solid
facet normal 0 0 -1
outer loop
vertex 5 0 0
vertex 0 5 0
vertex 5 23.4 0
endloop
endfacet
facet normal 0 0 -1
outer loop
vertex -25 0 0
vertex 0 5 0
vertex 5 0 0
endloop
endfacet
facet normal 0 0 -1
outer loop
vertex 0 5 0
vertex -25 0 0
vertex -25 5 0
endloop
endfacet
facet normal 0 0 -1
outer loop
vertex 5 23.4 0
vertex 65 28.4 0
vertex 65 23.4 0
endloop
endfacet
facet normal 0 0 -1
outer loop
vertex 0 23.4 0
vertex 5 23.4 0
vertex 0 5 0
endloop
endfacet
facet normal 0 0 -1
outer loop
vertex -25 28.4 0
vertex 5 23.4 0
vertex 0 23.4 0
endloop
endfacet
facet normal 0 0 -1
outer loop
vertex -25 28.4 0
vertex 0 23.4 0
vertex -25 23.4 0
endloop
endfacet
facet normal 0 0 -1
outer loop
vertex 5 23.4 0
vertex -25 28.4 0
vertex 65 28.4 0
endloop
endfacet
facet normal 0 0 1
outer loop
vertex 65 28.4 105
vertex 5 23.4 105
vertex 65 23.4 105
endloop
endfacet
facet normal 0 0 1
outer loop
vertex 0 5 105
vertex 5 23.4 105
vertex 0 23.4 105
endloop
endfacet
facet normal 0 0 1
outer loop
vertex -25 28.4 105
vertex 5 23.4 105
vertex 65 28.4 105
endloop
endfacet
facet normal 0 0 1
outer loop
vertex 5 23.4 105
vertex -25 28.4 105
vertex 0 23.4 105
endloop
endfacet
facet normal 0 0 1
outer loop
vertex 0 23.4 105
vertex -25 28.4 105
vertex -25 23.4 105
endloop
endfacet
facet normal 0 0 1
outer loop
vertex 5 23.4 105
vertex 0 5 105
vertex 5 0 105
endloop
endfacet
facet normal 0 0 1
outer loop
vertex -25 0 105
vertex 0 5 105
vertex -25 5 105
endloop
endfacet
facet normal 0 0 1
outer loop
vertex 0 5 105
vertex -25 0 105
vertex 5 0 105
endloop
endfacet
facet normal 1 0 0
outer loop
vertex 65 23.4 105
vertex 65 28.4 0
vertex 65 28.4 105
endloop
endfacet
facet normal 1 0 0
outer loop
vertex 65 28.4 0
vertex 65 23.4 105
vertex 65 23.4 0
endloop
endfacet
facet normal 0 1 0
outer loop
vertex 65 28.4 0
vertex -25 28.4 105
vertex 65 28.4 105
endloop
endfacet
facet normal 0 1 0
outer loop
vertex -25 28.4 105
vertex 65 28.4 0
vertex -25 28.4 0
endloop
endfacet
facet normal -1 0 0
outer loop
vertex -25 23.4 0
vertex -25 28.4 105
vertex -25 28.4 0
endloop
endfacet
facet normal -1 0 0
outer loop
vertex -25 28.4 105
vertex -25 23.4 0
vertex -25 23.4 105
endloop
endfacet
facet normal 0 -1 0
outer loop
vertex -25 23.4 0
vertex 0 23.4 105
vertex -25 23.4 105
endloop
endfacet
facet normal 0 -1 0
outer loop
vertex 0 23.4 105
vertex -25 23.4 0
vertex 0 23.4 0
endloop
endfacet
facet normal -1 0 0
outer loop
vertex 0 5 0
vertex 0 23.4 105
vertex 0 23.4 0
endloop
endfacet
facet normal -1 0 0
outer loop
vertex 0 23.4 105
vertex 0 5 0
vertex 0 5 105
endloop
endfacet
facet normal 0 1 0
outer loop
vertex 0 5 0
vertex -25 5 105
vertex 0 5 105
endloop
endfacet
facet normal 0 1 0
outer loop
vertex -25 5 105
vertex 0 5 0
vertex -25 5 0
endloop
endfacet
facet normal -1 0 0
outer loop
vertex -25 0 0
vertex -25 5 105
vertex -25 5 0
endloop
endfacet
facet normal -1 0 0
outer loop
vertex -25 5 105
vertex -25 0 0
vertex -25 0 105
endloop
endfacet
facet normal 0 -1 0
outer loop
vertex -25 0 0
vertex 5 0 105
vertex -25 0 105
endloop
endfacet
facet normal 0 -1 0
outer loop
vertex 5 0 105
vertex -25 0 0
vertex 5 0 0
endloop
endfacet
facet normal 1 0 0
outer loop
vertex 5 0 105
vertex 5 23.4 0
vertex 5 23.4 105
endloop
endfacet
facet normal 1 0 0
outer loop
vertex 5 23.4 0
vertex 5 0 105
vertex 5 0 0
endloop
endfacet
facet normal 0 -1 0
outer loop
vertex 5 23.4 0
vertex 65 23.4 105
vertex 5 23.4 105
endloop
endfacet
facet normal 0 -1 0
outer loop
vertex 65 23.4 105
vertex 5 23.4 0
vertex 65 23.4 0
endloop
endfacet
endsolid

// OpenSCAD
// --- Dimensions ---
shelf_thickness = 18.0;      // Thickness of the shelf (mm)
clamp_gap = 18.4;            // Gap for the shelf (mm)
spine_width = 5.0;           // Width of the vertical spine (mm)
spine_depth = 28.4;          // Depth of the spine (mm)
bottom_jaw_width = 25.0;     // Width of the bottom jaw (mm)
bottom_jaw_depth = 5.0;       // Depth of the bottom jaw (mm)
top_jaw_width = 90.0;        // Total width of top jaw + arm (mm)
top_jaw_depth = 5.0;         // Thickness of the top jaw/arm (mm)
arm_length = 65.0;           // Length of the arm extending forward (mm)
total_height = 105.0;        // Extrusion length along Z (mm)
hole_diameter = 20.0;        // Diameter of pipette holes (mm)
hole_spacing = 35.0;         // Spacing between hole centers (52.5 - 17.5)
hole_x_offset = 42.0;        // X position of hole centers (mm)

// --- Constants ---
$fn = 64;

// --- Modeling ---

// The part is printed lying on its side in the XY plane.
// The profile is defined in the XY plane and extruded along Z.
// Based on user description: 
// +Y is "up" (vertical in use), +X is "away from shelf" (horizontal in use).
// The extrusion is 105mm along Z.

module profile() {
    difference() {
        // Main Body Profile
        union() {
            // Spine: x=[0, 5], y=[0, 28.4]
            translate([0, 0])
                cube([spine_width, spine_depth]);
            
            // Bottom Jaw: x=[-25, 5], y=[0, 5]
            translate([-bottom_jaw_width, 0])
                cube([bottom_jaw_width + spine_width, bottom_jaw_depth]);
            
            // Top Jaw and Arm: x=[-25, 65], y=[23.4, 28.4]
            // Note: x goes from -25 to 65. Total width = 90.
            translate([-bottom_jaw_width, 23.4])
                cube([bottom_jaw_width + arm_length, top_jaw_depth]);
        }

        // Holes: 20mm diameter, through the arm along Y.
        // Centered at x=42, z=17.5, 52.5, 87.5.
        // Since the part is extruded along Z, the "holes" are cylinders 
        // oriented along the Y axis.
        // To make them "through the arm", they must cut through the Y dimension.
        // However, the user says "through the arm along Y (vertically in use)".
        // In the print orientation (XY plane), Y is the depth of the profile.
        // If the holes are "through the arm along Y", they cut through the thickness.
        // But the user says "vertically in use", and in use +Y is up.
        // This implies the holes are drilled through the Z-axis (the extrusion direction)
        // OR the user meant the holes are perpendicular to the arm's length.
        // Re-reading: "three round 20mm holes go through the arm along Y (vertically in use)".
        // If +Y is up, and they go "along Y", they are vertical holes.
        // In the print orientation (XY plane), the Z axis is the extrusion.
        // If the holes are vertical in use, they must be drilled along the Y axis in the model.
        
        // Let's interpret "through the arm along Y" as the hole axis being the Y axis.
        // This would mean the holes are drilled through the thickness of the arm.
        // But the user says "vertically in use", and +Y is up. 
        // Therefore, the hole axis is the Y axis.
        
        for (z_pos = [17.5, 52.5, 87.5]) {
            translate([hole_x_offset, -1, z_pos])
                rotate([0, 90, 0])
                    cylinder(d = hole_diameter, h = spine_depth + 10);
        }
    }
}

// Final Assembly
// We define the profile and extrude it along Z.
// However, the holes are defined in the profile logic above.
// To ensure the holes are "through" the part, we must extrude the profile 
// and then subtract the cylinders.

difference() {
    // The extruded profile
    linear_extrude(height = total_height)
        profile_shape();

    // The holes (cylinders along Y)
    // Since we extruded along Z, we must subtract cylinders along Y.
    // The profile_shape() is the 2D footprint.
    for (z_pos = [17.5, 52.5, 87.5]) {
        translate([hole_x_offset, -1, z_pos])
            rotate([0, 90, 0])
                cylinder(d = hole_diameter, h = total_height + 2);
    }
}

// Helper module for the 2D profile
module profile_shape() {
    union() {
        // Spine
        square([spine_width, spine_depth]);
        // Bottom Jaw
        translate([-bottom_jaw_width, 0])
            square([bottom_jaw_width + spine_width, bottom_jaw_depth]);
        // Top Jaw and Arm
        translate([-bottom_jaw_width, 23.4])
            square([bottom_jaw_width + arm_length, top_jaw_depth]);
    }
}
